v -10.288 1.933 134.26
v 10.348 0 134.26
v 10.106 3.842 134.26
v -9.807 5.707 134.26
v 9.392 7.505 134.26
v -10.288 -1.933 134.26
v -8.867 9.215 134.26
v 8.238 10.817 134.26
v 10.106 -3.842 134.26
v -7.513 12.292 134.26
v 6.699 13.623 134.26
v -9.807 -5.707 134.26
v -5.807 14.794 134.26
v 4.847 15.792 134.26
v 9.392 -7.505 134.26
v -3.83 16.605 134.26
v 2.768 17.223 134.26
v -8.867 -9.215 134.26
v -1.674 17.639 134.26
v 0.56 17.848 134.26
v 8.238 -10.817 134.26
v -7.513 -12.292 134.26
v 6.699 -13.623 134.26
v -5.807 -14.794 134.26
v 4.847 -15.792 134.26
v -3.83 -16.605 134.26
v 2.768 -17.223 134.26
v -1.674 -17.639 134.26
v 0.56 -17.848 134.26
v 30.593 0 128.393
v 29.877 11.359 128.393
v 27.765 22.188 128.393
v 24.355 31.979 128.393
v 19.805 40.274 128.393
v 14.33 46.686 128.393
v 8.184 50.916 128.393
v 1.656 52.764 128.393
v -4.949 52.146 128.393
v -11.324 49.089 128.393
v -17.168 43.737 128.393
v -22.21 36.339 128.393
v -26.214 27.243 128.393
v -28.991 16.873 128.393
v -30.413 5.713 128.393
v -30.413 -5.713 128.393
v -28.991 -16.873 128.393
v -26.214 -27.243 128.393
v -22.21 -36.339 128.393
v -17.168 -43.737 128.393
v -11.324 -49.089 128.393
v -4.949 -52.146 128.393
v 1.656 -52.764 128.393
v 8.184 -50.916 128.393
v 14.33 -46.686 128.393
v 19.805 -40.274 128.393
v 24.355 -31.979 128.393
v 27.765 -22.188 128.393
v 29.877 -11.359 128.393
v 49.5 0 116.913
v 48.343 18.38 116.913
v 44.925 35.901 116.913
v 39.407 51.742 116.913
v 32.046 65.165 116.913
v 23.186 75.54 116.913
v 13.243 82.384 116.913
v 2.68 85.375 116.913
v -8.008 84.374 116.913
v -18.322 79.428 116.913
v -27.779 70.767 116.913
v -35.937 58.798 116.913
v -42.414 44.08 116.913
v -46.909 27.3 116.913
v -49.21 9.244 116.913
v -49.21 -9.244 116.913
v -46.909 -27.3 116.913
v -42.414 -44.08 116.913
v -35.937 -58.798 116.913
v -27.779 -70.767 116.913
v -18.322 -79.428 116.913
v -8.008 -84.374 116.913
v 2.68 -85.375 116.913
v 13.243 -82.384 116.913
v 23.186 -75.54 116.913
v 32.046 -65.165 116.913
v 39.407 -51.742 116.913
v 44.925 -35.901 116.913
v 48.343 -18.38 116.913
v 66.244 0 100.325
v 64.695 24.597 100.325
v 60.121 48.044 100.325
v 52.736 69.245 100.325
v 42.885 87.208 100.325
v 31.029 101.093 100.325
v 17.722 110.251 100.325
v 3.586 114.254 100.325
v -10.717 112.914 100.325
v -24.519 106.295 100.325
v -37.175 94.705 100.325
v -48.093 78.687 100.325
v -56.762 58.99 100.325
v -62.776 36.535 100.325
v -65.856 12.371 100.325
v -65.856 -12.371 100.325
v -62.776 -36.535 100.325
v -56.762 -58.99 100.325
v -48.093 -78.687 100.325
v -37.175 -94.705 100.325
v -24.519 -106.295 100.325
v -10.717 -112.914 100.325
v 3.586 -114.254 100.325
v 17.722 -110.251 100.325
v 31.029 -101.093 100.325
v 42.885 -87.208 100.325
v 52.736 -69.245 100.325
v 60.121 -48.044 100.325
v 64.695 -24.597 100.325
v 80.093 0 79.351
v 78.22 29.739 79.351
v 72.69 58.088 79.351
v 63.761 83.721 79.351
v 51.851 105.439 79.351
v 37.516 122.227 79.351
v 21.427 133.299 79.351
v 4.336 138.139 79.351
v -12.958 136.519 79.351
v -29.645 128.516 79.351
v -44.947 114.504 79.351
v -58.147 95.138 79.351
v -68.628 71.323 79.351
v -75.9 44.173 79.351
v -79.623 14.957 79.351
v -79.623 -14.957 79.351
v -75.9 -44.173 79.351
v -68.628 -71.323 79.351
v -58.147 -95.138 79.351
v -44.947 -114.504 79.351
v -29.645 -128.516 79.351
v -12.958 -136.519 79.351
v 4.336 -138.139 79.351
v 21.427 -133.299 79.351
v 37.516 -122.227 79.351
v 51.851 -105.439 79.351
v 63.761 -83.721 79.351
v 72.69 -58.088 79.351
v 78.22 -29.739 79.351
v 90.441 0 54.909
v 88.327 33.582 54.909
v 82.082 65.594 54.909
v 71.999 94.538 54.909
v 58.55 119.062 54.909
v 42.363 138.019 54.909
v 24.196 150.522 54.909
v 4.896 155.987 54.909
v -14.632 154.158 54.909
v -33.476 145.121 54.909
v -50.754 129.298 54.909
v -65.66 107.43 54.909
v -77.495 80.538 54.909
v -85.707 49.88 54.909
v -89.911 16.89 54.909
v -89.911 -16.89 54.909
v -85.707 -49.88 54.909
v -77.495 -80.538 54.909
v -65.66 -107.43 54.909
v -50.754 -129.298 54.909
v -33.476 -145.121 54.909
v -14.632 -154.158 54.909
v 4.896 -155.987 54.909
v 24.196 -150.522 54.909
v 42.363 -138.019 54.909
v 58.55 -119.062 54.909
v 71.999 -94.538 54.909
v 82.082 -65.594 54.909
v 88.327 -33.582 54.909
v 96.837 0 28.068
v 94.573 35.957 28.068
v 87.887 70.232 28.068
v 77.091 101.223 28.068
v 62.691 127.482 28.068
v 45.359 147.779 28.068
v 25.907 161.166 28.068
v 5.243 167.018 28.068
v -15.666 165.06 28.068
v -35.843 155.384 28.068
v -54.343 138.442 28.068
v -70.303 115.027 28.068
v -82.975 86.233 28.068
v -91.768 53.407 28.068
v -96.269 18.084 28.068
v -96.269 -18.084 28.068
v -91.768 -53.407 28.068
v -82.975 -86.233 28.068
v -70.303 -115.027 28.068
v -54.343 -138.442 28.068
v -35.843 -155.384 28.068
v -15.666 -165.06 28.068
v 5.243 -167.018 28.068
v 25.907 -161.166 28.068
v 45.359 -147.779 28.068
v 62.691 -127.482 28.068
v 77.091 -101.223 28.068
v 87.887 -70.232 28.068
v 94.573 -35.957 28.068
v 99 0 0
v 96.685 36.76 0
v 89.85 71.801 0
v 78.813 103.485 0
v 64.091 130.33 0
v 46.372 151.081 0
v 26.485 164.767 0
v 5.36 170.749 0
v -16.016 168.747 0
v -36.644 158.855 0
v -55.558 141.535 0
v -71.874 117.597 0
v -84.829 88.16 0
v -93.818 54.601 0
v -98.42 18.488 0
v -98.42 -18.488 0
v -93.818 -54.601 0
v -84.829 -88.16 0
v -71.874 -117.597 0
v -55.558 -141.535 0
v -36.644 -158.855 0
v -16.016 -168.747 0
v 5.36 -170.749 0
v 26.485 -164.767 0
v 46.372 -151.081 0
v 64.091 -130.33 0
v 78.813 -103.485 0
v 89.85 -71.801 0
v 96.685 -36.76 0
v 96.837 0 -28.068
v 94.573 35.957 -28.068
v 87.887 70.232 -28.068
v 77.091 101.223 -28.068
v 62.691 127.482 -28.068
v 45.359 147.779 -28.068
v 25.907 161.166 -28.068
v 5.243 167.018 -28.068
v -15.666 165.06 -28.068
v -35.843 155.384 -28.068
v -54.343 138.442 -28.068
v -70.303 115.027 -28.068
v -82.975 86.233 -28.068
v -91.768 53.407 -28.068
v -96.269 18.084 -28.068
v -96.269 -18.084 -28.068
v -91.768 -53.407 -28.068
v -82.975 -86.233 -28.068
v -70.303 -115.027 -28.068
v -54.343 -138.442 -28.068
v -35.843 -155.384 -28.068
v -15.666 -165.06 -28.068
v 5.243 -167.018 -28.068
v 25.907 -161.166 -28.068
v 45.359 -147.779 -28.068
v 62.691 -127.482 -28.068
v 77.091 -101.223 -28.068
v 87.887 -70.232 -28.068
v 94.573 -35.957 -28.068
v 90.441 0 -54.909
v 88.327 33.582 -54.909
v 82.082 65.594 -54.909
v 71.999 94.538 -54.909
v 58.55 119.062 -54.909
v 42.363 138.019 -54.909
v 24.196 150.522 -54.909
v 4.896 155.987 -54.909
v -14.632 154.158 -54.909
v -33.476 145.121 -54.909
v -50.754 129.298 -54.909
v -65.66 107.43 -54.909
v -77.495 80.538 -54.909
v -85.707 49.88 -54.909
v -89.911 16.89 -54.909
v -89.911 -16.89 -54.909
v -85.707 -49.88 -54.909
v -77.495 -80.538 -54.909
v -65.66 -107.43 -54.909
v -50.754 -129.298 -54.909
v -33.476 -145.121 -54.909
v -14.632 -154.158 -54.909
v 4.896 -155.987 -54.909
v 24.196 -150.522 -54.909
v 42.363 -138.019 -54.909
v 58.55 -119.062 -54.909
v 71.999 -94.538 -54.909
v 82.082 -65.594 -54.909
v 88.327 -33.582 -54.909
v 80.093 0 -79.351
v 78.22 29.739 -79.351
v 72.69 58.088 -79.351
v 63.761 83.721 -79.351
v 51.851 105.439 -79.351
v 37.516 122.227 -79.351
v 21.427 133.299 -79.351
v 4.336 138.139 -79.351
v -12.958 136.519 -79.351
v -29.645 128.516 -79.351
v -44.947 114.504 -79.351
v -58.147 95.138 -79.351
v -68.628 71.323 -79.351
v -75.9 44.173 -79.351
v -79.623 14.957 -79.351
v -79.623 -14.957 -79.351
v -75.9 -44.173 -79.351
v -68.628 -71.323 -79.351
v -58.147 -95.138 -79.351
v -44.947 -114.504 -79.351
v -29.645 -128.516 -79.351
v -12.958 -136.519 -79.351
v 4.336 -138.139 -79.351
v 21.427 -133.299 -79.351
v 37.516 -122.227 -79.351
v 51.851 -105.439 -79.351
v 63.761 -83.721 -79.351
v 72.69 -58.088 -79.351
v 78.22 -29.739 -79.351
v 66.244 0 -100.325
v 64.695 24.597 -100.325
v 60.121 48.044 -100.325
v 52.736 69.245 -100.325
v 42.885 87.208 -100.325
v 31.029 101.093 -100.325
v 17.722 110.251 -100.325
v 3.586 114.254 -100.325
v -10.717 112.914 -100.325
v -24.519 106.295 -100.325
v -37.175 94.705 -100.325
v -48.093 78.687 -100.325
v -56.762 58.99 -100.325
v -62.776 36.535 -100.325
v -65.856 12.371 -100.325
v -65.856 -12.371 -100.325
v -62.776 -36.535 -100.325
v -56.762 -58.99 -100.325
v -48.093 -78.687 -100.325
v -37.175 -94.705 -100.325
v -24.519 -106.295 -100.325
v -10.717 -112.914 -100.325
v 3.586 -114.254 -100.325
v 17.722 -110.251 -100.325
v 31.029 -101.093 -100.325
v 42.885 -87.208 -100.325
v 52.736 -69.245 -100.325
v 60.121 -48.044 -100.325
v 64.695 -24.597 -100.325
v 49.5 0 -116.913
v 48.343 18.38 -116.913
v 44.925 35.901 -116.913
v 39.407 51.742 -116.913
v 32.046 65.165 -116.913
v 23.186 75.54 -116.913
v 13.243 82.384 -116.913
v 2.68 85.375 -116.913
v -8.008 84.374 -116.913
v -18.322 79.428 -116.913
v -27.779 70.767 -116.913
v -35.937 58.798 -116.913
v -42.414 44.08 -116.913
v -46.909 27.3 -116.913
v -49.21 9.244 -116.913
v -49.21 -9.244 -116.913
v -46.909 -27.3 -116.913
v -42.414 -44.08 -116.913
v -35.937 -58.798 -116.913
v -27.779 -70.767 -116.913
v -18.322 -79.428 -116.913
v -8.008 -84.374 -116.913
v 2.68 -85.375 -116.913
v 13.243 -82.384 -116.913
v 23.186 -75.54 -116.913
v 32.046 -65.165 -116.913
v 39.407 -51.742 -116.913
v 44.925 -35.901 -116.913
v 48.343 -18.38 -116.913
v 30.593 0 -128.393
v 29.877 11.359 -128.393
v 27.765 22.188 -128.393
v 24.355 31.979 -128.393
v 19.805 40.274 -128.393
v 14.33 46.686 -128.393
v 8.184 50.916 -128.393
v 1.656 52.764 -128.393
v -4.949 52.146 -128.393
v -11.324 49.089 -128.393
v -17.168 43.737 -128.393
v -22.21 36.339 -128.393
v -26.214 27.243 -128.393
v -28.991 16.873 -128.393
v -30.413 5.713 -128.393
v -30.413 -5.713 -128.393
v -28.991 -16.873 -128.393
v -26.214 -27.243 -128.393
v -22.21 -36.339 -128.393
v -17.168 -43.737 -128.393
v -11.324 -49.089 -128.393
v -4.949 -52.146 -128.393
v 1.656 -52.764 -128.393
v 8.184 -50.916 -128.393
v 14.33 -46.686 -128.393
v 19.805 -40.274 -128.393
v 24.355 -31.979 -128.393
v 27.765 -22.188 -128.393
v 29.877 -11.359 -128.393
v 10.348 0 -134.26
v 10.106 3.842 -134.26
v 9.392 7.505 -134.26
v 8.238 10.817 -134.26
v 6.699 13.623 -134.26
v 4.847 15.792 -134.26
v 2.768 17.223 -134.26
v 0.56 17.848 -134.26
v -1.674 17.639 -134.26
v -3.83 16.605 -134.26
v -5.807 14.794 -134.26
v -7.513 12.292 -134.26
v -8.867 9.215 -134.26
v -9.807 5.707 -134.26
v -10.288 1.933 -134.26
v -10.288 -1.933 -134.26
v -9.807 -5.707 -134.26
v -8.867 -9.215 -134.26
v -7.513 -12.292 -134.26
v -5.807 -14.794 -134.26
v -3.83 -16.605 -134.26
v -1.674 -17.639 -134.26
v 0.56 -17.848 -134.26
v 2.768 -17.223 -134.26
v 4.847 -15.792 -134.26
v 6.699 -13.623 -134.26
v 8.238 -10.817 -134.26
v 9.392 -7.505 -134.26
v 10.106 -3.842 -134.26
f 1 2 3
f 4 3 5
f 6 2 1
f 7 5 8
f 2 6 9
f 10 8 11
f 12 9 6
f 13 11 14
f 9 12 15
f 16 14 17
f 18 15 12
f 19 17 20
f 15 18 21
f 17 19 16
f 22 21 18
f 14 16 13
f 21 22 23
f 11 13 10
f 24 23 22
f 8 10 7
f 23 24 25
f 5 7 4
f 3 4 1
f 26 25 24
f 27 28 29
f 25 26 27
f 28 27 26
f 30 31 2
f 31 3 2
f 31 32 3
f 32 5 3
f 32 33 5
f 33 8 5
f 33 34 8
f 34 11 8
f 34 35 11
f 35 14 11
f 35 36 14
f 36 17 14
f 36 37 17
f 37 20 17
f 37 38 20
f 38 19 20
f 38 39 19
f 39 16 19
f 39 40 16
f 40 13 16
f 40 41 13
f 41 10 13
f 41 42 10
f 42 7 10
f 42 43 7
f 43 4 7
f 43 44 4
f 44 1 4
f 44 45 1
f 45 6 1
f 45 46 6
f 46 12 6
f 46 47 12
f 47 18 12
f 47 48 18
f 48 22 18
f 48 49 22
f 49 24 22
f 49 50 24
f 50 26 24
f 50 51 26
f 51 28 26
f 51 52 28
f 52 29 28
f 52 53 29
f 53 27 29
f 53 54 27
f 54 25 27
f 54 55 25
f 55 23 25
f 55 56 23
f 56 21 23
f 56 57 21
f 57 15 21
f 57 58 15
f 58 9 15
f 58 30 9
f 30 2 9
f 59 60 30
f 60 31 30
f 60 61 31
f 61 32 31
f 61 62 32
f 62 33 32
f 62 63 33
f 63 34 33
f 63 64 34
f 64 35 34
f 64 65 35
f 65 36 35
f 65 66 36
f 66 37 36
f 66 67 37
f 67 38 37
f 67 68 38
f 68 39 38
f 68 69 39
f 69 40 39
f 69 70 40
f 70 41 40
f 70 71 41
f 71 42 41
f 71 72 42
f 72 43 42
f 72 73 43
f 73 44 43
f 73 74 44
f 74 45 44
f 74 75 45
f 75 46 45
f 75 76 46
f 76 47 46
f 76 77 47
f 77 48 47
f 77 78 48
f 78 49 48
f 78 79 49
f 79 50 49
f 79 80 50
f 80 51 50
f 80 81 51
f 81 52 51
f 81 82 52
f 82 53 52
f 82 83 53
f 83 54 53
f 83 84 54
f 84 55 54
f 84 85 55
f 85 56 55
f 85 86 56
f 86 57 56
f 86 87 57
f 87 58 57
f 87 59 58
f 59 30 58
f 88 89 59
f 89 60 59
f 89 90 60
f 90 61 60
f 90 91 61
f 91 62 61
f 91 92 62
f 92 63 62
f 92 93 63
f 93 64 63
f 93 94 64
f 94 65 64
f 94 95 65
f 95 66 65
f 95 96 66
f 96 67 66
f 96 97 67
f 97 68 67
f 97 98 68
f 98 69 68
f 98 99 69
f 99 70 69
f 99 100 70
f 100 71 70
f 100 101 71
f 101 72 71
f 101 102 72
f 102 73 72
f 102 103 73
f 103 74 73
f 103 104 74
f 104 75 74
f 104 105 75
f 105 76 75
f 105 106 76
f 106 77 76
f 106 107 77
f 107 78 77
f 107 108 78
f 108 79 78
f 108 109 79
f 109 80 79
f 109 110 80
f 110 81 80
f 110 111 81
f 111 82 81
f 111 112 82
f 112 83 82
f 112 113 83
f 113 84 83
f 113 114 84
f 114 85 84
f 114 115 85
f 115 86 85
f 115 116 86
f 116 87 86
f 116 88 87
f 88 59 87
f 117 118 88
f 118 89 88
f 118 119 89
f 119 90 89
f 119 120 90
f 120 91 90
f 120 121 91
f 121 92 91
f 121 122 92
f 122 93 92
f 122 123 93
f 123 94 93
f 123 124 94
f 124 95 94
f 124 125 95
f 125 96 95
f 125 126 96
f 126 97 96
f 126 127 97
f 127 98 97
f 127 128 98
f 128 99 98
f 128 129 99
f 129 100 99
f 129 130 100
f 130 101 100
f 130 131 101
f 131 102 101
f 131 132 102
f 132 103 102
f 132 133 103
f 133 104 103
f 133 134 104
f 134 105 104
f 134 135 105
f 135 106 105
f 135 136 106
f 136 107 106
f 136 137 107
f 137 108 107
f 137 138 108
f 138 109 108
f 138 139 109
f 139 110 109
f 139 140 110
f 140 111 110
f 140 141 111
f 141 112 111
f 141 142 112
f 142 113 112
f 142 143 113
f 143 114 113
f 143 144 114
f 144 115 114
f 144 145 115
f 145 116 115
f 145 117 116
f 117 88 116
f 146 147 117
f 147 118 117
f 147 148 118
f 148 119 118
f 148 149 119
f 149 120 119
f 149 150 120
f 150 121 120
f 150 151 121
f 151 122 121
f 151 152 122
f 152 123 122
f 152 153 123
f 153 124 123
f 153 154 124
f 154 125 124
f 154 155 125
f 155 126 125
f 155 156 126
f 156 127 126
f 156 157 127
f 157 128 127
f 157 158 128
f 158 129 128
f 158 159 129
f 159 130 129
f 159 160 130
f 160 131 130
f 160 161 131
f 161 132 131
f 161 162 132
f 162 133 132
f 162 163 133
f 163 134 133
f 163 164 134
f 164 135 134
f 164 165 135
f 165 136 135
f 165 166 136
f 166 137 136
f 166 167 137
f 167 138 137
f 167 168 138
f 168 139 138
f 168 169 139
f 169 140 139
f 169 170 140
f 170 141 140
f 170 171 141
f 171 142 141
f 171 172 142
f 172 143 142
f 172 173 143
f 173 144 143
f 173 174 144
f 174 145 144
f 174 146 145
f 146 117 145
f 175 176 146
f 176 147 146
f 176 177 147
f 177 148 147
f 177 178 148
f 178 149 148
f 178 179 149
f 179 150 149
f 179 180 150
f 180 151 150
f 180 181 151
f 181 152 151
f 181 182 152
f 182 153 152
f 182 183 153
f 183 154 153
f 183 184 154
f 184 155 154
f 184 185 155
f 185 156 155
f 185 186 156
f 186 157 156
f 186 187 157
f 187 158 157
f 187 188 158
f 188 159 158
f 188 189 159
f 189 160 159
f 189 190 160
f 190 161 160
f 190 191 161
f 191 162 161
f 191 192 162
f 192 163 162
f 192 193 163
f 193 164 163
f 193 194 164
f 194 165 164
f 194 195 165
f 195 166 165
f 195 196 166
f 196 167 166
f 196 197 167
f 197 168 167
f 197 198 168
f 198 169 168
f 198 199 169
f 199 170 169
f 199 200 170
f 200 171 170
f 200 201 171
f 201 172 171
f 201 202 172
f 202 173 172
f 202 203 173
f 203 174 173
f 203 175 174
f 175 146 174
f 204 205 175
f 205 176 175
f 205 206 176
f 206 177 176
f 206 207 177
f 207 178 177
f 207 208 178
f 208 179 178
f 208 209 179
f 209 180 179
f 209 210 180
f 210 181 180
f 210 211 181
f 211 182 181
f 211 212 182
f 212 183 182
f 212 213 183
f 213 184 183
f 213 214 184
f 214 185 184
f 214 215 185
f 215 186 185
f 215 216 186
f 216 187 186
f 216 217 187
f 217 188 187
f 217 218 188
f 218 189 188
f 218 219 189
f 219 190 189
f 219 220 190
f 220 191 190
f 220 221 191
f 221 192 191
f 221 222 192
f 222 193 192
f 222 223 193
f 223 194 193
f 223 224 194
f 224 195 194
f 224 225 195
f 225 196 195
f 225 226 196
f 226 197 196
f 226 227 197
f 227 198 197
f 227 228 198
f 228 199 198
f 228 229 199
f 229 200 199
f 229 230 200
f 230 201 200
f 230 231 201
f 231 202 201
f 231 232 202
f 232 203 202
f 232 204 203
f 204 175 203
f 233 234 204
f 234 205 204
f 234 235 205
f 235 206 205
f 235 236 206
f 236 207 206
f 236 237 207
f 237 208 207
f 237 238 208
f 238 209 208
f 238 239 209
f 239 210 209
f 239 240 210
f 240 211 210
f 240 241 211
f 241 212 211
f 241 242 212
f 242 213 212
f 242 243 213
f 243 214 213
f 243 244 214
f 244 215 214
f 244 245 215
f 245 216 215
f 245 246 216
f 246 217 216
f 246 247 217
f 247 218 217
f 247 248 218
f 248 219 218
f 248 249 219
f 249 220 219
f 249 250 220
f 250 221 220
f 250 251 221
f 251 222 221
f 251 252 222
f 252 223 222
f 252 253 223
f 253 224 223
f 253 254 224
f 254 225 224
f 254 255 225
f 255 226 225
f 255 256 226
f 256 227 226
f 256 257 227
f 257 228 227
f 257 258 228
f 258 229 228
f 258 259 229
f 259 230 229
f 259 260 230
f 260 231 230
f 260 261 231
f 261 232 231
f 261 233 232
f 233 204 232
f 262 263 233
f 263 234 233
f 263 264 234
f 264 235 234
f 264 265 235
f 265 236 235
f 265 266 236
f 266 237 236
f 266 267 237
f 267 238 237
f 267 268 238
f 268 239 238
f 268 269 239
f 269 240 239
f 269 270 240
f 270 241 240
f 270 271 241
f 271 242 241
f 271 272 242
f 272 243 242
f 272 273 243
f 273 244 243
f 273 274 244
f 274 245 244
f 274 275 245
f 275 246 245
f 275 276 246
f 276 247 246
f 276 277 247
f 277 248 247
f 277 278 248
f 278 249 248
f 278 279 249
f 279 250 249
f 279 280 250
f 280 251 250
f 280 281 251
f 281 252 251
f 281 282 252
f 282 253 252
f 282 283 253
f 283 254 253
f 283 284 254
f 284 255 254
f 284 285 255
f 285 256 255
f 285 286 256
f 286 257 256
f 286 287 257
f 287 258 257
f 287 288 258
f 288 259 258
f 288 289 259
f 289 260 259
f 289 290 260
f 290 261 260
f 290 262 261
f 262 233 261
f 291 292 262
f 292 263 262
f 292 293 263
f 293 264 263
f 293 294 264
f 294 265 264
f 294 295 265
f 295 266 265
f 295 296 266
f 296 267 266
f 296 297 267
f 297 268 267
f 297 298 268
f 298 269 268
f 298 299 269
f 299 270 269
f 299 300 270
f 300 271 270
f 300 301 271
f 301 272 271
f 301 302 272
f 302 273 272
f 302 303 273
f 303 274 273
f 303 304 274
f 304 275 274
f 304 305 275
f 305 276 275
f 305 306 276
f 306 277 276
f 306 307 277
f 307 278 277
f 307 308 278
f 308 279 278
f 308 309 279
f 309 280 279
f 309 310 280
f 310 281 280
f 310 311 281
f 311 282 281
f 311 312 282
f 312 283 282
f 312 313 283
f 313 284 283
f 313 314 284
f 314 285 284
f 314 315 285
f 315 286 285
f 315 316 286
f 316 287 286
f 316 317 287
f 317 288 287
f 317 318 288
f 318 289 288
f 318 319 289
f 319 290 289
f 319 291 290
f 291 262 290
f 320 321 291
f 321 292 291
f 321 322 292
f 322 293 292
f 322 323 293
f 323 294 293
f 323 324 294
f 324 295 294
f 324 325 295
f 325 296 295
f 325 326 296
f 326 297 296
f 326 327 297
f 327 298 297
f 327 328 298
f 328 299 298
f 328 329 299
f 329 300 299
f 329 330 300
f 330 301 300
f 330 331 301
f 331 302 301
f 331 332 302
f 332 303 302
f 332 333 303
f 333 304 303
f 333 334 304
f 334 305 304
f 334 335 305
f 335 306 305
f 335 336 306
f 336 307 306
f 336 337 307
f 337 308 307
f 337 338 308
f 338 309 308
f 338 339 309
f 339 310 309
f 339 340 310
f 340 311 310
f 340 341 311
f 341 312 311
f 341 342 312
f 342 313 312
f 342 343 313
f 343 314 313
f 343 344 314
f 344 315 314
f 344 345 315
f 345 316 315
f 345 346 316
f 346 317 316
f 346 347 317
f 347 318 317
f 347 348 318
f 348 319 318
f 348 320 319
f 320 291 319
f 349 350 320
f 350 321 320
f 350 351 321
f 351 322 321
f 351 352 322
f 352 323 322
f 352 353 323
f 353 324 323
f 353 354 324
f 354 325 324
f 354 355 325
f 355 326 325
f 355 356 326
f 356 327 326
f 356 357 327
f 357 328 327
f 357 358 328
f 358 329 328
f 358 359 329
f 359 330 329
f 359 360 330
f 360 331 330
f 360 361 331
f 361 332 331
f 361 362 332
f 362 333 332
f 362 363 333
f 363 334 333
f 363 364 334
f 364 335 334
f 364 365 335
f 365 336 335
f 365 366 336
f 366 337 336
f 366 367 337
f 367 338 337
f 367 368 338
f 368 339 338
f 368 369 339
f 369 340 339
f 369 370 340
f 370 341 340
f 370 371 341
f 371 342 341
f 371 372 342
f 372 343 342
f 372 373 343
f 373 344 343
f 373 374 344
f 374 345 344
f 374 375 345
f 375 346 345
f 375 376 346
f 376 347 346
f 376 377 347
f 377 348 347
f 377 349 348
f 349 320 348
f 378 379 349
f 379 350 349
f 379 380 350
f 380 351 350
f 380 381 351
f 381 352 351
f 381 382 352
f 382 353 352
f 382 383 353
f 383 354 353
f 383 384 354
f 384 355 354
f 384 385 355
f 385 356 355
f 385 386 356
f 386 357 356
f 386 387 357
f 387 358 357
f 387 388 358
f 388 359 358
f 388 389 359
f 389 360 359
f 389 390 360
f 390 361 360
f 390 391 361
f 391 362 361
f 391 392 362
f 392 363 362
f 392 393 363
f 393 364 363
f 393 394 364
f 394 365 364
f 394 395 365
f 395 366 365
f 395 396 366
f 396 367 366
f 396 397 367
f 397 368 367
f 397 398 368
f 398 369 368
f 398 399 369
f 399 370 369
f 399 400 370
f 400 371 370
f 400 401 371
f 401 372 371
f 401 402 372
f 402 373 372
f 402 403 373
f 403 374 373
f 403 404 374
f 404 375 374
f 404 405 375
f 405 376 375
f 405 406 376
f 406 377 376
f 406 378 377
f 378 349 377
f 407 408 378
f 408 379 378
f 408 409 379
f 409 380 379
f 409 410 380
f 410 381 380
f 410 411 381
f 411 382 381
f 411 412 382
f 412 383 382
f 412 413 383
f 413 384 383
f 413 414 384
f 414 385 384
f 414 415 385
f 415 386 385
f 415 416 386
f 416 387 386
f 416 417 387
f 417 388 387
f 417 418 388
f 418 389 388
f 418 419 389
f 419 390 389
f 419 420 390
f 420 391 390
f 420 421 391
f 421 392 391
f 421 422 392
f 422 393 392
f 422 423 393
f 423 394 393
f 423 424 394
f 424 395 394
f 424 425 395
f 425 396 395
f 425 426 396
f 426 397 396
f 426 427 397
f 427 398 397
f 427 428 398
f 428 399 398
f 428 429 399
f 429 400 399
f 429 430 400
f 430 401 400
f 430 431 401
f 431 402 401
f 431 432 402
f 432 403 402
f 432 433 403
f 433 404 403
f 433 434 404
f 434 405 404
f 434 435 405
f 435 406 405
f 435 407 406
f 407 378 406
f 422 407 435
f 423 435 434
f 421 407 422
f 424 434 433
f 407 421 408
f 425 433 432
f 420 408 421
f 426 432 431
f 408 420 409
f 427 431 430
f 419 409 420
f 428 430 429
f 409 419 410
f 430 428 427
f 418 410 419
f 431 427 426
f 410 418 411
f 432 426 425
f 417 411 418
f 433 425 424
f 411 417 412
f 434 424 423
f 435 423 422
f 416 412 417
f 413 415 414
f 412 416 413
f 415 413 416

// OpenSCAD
// Generated by SolidPython 1.0.1 on 2020-07-29 00:46:50


scale(v = [11, 19, 15]) {
	sphere(r = 9);
}
/***********************************************
*********      SolidPython code:      **********
************************************************
 
# import packages: SolidPython
from solid import *
from solid.utils import *
from itertools import chain, combinations, permutations


class Resize:

    def __init__(self, scad_file):
        self.scad_file = scad_file
        #self.scad_file = import_scad(scad_file)
        # cone/cylinder param:
        self.r1 = 0
        self.r2 = 0
        self.h = 0
        # rectangular prism param:
        self.w = 0
        self.l = 0
        # ellipse param:
        self.r = 0

    # import OpenScad code (file name corresponds to shape)


    # classify shape + parameters
    def assign(self, param1, param2, param3):
        if self.scad_file == 'cone.scad':
            self.r1 = param1
            self.r2 = param2
            self.h = param3
        elif self.scad_file == 'cylinder.scad':
            self.r1 = param1
            self.r2 = param2
            self.h = param3
        elif self.scad_file == 'rectangularPrism.scad':
            self.h = param1
            self.l = param2
            self.w = param3
        else:
            self.r = param1
            self.h = param2

    # resize parameters
    def iterate(self):
        x = range(3, 20, 2)
        i = 1
        if self.scad_file == 'cone.scad':
            tempList = list(permutations(x, 2))
            for temp in tempList:
                param1 = temp[0]
                param2 = temp[1]
                filepath = 'produced_scad_files/' + 'cone' + str(param1) + '_' + str(param2) + '_' + '.scad'
                scad_render_to_file(cylinder(h=param1, r1=param2, r2=0), filepath)

        elif self.scad_file == 'cylinder.scad':
            tempList = list(permutations(x, 3))
            for temp in tempList:
                param1 = temp[0]
                param2 = temp[1]
                filepath = 'produced_scad_files/' + 'cylinder' + str(param1) + '_' + str(param2) + '_' + '.scad'
                scad_render_to_file(cylinder(h=param1, r1=param2, r2=param2), filepath)

        elif self.scad_file == 'rectangularPrism.scad':
            tempList = list(permutations(x, 3))
            for temp in tempList:
                param1 = temp[0]
                param2 = temp[1]
                param3 = temp[2]
                filepath = 'produced_scad_files/' + 'rectangularPrism' + str(param1) + '_' + str(param2) + '_' + str(
                    param3) + '.scad'
                scad_render_to_file(cube(size=(param1, param2, param3)), filepath)

        elif self.scad_file == 'ellipse.scad':
            tempList = list(permutations(x, 4))
            for temp in tempList:
                param1 = temp[0]
                param2 = temp[1]
                param3 = temp[2]
                param4 = temp[3]
                filepath = 'produced_scad_files/' + 'ellipse' + str(param1) + '_' + str(param2) + '_' + str(param3) + '_' + str(param4) + '.scad'
                scad_render_to_file(scale([param1, param2, param3])(sphere(r=param4)), filepath)

    def render_to_scadfile(self):
        scad_render_to_file(scad, 'example.scad') 
 
************************************************/
